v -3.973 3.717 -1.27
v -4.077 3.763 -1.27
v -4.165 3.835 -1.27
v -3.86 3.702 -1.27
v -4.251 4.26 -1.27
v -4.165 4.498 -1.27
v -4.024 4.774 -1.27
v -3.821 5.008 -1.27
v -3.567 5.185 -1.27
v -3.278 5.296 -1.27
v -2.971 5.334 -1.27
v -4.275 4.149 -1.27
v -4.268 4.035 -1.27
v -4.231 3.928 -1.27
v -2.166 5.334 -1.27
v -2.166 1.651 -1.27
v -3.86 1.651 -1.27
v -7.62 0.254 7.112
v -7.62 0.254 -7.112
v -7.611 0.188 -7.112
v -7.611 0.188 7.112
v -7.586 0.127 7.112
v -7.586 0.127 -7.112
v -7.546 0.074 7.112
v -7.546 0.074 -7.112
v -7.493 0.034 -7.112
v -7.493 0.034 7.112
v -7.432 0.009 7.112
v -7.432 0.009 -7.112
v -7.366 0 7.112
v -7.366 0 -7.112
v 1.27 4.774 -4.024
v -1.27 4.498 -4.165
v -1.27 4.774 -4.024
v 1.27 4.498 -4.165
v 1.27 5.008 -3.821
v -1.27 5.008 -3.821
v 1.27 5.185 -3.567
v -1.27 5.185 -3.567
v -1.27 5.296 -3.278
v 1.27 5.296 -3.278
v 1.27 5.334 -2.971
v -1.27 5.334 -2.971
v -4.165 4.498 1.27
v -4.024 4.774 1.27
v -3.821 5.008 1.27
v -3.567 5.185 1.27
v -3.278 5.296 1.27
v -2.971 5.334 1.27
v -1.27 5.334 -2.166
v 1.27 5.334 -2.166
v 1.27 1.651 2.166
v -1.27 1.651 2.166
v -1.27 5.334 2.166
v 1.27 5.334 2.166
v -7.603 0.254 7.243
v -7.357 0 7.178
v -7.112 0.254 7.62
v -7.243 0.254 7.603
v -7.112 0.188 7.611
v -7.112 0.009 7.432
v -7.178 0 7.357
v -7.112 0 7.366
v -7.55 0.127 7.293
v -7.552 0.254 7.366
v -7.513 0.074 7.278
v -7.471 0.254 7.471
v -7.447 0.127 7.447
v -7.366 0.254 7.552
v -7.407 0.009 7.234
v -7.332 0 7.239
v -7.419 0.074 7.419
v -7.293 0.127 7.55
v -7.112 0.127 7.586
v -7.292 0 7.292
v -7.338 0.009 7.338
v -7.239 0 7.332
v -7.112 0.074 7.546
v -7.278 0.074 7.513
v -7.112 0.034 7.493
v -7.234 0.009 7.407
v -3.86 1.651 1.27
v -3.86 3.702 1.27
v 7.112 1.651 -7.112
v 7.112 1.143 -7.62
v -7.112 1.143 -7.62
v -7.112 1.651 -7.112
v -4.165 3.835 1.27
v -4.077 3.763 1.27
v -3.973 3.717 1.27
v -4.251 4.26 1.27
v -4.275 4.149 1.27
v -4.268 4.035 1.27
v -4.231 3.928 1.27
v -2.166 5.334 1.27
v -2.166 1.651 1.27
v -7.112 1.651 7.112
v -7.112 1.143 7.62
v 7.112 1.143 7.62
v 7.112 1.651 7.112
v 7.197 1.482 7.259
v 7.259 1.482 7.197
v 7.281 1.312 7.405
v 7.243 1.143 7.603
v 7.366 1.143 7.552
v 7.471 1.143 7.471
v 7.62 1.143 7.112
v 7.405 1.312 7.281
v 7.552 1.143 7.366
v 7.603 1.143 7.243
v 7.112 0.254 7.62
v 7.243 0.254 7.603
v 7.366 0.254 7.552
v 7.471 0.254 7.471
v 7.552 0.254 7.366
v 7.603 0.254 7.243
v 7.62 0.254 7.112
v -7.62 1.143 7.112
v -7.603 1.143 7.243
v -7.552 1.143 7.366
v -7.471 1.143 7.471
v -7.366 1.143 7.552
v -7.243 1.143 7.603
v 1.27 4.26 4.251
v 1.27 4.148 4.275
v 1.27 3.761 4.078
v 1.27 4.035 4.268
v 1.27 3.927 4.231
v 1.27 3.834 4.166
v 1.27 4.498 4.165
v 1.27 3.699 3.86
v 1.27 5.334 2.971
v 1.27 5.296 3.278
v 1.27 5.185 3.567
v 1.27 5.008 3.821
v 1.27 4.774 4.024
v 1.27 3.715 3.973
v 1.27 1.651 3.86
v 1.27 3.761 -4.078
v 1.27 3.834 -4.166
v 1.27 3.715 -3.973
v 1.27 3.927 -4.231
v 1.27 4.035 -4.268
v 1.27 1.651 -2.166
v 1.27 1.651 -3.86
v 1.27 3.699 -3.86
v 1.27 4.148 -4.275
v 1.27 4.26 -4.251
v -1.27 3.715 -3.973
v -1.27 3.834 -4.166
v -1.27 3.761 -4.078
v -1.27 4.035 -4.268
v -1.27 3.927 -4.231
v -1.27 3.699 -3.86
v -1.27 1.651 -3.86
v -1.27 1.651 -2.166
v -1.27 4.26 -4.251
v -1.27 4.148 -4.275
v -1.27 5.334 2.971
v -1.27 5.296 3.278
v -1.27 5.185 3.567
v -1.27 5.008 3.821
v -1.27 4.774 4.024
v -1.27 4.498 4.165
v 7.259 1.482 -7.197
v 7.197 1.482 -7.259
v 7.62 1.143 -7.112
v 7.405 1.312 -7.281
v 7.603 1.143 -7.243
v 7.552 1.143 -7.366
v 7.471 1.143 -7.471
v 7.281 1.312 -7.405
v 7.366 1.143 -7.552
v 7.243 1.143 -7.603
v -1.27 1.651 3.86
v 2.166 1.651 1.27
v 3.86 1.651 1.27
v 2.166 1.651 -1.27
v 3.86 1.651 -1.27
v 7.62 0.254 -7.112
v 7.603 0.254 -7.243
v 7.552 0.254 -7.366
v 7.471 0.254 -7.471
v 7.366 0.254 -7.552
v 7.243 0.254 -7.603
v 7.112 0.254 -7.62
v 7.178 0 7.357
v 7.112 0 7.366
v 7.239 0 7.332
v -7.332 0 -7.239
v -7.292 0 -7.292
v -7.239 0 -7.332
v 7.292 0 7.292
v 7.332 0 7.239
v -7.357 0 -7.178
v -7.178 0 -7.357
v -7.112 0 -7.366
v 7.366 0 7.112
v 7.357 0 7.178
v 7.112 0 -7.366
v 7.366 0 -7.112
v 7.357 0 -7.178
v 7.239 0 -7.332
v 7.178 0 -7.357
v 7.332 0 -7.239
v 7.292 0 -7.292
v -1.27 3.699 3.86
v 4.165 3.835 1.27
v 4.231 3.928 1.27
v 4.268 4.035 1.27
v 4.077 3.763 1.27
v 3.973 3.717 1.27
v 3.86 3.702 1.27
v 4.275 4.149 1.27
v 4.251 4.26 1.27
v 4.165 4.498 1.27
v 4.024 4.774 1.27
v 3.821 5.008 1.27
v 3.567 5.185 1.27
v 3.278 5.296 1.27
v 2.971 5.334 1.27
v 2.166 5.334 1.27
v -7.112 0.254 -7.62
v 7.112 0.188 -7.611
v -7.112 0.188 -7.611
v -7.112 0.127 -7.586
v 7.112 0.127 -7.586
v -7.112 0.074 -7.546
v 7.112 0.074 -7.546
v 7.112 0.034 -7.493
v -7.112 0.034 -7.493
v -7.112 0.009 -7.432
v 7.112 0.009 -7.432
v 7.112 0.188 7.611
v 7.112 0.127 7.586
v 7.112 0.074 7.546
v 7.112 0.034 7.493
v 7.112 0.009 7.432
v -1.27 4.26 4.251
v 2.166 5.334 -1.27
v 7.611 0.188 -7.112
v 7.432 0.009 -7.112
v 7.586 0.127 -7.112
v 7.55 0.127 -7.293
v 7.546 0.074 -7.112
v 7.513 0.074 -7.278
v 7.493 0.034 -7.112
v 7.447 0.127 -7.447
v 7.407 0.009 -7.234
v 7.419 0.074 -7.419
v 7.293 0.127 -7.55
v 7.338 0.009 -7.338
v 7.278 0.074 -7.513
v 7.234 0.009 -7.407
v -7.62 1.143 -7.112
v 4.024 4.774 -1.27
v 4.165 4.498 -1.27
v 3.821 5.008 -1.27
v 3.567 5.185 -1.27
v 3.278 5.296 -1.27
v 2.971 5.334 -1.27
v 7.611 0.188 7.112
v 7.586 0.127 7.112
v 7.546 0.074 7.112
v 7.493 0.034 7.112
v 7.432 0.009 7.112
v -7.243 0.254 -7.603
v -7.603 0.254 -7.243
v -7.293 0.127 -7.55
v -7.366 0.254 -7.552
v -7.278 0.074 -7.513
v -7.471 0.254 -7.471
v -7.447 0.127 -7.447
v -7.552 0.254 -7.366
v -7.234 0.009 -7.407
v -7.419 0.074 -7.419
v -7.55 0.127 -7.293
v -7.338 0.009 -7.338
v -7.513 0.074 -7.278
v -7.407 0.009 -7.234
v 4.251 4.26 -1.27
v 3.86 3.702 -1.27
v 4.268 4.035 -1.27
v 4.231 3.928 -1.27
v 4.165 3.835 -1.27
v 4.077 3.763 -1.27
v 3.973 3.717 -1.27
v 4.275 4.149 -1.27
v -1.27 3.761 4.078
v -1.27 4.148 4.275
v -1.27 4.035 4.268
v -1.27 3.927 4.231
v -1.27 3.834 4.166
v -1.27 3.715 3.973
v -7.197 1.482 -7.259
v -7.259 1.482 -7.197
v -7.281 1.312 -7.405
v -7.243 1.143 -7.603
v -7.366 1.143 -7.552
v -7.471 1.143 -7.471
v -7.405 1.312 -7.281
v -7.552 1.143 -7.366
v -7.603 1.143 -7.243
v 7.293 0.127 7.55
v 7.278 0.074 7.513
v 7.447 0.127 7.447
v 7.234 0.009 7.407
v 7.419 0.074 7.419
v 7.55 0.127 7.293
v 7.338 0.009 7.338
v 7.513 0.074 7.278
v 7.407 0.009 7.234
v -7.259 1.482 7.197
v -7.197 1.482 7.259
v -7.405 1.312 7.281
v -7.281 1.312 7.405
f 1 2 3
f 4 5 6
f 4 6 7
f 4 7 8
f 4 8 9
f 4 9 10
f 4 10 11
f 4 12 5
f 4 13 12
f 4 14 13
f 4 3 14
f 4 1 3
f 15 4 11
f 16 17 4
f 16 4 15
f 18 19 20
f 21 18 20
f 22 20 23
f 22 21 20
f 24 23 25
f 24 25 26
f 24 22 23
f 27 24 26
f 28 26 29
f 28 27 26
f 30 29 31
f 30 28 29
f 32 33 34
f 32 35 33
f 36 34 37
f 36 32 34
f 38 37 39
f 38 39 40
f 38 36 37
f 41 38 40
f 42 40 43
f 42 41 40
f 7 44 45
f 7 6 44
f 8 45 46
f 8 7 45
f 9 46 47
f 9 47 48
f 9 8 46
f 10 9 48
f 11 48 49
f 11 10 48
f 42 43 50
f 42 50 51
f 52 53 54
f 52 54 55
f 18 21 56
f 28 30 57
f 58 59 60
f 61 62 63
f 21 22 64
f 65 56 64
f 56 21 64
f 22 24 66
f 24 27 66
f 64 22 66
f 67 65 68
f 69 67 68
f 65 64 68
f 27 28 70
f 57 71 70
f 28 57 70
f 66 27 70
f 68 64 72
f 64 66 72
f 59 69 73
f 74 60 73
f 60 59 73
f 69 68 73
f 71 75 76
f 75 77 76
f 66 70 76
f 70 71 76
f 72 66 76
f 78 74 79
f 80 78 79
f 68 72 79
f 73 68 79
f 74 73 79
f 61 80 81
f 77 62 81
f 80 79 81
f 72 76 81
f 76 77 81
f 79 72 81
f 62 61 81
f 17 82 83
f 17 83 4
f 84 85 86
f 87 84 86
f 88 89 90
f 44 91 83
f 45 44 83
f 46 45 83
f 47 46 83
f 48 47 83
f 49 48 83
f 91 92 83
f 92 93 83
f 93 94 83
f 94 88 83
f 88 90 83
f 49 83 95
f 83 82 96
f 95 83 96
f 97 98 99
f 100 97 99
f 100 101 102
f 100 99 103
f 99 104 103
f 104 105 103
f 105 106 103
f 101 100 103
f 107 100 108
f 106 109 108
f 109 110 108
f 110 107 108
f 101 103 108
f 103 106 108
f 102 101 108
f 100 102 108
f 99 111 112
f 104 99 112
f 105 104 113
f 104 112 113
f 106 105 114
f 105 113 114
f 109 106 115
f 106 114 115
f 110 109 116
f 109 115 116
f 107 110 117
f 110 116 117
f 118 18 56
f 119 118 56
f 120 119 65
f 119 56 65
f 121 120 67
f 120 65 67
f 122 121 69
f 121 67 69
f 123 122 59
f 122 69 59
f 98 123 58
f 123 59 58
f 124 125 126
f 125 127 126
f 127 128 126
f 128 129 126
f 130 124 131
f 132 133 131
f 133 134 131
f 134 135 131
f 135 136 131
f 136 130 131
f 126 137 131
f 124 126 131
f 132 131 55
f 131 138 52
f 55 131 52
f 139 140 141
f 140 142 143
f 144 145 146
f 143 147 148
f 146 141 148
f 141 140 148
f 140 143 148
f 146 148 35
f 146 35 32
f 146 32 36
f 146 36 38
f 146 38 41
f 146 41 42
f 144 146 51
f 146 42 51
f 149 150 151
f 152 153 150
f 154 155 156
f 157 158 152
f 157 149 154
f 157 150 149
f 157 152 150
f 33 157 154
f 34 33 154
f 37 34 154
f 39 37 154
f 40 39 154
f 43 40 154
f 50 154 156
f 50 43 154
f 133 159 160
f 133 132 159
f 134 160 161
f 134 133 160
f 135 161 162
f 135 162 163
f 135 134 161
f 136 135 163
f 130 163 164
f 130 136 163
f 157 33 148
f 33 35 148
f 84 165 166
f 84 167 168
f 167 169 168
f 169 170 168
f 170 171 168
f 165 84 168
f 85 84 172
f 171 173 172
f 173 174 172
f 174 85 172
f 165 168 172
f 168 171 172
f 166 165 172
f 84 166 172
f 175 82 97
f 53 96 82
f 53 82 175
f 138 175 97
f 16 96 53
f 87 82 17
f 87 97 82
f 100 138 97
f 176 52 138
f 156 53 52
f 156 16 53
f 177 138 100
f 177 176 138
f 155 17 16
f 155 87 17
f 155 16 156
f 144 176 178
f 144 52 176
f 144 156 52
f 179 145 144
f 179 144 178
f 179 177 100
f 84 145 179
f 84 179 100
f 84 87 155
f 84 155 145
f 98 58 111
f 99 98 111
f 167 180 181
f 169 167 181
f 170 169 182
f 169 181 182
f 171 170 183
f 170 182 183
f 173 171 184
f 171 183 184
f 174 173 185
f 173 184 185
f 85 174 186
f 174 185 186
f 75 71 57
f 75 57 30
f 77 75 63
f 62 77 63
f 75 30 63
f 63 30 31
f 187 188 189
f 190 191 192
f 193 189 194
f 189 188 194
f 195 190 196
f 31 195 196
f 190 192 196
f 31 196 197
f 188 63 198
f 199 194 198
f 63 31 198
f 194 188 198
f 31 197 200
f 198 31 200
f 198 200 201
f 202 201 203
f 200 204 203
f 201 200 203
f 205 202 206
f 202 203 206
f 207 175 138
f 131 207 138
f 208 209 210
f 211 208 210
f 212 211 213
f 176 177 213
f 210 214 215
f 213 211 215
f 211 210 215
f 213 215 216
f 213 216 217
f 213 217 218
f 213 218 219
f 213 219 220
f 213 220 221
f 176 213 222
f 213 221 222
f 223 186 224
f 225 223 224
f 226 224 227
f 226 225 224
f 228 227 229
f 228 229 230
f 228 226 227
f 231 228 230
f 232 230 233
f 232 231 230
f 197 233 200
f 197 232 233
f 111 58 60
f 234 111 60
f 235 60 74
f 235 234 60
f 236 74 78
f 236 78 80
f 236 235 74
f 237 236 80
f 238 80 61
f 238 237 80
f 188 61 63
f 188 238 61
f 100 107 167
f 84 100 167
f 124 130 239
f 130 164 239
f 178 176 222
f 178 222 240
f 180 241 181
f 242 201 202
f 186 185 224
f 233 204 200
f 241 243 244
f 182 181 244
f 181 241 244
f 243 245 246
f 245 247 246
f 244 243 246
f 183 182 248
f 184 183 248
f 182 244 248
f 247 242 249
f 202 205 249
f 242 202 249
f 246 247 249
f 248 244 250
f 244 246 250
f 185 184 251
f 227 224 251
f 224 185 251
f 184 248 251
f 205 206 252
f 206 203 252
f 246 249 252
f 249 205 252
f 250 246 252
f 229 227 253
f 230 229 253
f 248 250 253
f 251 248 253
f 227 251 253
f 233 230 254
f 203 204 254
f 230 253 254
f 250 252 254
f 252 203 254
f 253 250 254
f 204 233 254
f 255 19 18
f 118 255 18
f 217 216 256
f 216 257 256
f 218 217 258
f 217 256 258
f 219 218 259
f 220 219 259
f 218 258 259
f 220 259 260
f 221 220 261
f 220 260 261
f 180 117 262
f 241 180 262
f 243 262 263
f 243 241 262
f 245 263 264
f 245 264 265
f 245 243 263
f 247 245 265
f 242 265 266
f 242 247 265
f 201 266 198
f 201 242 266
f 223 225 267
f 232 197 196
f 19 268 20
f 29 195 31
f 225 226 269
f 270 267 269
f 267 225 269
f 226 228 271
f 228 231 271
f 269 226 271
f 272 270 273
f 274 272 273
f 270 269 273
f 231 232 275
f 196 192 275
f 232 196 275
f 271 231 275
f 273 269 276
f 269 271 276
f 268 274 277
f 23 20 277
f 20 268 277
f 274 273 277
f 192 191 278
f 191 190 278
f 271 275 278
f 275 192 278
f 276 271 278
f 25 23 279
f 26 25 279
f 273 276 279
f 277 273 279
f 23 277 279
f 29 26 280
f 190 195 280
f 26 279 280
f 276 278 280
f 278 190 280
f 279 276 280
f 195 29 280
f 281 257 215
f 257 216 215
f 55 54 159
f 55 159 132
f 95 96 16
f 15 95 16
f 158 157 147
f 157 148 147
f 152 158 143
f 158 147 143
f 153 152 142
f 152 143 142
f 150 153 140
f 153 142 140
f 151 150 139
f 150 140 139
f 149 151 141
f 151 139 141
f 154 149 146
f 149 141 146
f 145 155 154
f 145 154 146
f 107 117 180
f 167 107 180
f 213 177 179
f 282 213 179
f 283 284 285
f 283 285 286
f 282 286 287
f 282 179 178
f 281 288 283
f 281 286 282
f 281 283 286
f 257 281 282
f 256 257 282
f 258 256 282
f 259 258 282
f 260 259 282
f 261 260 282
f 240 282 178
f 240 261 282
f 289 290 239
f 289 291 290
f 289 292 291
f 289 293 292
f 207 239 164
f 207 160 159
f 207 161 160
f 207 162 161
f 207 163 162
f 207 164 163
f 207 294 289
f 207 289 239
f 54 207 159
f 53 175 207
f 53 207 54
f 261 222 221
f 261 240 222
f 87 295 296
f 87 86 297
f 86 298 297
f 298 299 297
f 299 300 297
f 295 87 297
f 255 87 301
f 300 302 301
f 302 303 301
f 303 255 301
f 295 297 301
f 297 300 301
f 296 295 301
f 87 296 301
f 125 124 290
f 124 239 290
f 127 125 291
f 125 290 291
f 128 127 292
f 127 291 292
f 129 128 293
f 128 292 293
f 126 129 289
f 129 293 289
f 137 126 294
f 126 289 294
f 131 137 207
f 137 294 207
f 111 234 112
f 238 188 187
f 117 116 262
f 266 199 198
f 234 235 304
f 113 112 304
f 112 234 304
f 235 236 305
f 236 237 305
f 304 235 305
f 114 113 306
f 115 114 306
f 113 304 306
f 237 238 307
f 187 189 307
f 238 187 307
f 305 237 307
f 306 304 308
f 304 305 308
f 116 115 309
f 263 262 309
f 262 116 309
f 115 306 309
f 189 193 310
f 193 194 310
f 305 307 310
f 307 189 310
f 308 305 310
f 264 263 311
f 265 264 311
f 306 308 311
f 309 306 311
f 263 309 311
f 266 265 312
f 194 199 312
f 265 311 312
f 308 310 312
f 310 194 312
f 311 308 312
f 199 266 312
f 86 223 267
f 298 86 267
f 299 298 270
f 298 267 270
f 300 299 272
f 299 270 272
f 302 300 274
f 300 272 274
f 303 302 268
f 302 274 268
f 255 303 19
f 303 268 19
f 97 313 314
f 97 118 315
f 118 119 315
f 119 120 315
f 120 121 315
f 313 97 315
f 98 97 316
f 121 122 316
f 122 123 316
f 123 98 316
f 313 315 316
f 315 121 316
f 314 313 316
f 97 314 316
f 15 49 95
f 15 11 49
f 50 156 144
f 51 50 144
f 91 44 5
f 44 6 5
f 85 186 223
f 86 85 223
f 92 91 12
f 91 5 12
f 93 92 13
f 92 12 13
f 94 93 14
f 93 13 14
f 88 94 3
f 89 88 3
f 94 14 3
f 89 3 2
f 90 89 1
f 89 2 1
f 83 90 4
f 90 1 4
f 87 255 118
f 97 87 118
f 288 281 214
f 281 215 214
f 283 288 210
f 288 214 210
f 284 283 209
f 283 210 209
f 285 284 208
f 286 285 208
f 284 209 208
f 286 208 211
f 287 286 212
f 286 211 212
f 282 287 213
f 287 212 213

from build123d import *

# Parameters (mm, degrees)
BOSS_EXTRUDE1_DEPTH = 1.651
SKETCH3_W           = 2.54
SKETCH3_H           = 1.694812446
SKETCH3_W_2         = 1.694812446
SKETCH3_H_2         = 2.54
BOSS_EXTRUDE2_DEPTH = 3.683
BOSS_EXTRUDE3_DEPTH = 1.27
BOSS_EXTRUDE4_DEPTH = 1.27
FILLET1_R           = 1.27
CHAMFER1_SIZE       = 0.508
FILLET2_R           = 0.254


with BuildPart() as part:
    # Sketch1 → Boss-Extrude1 (new body)
    with BuildSketch(Plane(origin=(0, 0, 0), x_dir=(1, 0, 0), z_dir=(0, 1, 0))):
        with BuildLine():
            Line((-7.62, 7.112), (-7.62, -7.112))
            ThreePointArc((-7.62, -7.112), (-7.471210245, -7.471210245), (-7.112, -7.62))
            Line((-7.112, -7.62), (7.112, -7.62))
            ThreePointArc((7.112, -7.62), (7.471210245, -7.471210245), (7.62, -7.112))
            Line((7.62, -7.112), (7.62, 7.112))
            ThreePointArc((7.62, 7.112), (7.471210245, 7.471210245), (7.112, 7.62))
            Line((7.112, 7.62), (-7.112, 7.62))
            ThreePointArc((-7.112, 7.62), (-7.471210245, 7.471210245), (-7.62, 7.112))
        make_face()
    extrude(amount=BOSS_EXTRUDE1_DEPTH)

    # Sketch3 → Boss-Extrude2 (add)
    with BuildSketch(Plane(origin=(0, 1.651, 0), x_dir=(1, 0, 0), z_dir=(0, 1, 0))):
        with Locations((0, 3.013059552)):
            Rectangle(SKETCH3_W, SKETCH3_H)
        with Locations((3.013059552, 0)):
            Rectangle(SKETCH3_W_2, SKETCH3_H_2)
        with Locations((0, -3.013059552)):
            Rectangle(SKETCH3_W, SKETCH3_H)
        with Locations((-3.013059552, 0)):
            Rectangle(SKETCH3_W_2, SKETCH3_H_2)
    extrude(amount=BOSS_EXTRUDE2_DEPTH)

    # Sketch4 → Boss-Extrude3 (add, symmetric)
    with BuildSketch(Plane.XY):
        with BuildLine():
            Line((-3.860465775, 5.334), (-4.251394799, 4.259931334))
            ThreePointArc((-4.251394799, 4.259931334), (-4.201247752, 3.879026697), (-3.860465775, 3.701626828))
            Line((-3.860465775, 3.701626828), (-3.860465775, 5.334))
        make_face()
        with BuildLine():
            Line((3.860465775, 5.334), (4.251394799, 4.259931334))
            ThreePointArc((4.251394799, 4.259931334), (4.201247752, 3.879026697), (3.860465775, 3.701626828))
            Line((3.860465775, 3.701626828), (3.860465775, 5.334))
        make_face()
    extrude(amount=BOSS_EXTRUDE3_DEPTH, both=True)

    # Sketch5 → Boss-Extrude4 (add, symmetric)
    with BuildSketch(Plane(origin=(0, 0, 0), x_dir=(0, 0, -1), z_dir=(1, 0, 0))):
        with BuildLine():
            Line((-3.860465775, 5.334), (-4.251394799, 4.259931334))
            ThreePointArc((-4.251394799, 4.259931334), (-4.201512131, 3.878082751), (-3.860465775, 3.699242027))
            Line((-3.860465775, 3.699242027), (-3.860465775, 5.334))
        make_face()
        with BuildLine():
            Line((3.860465775, 5.334), (4.251394799, 4.259931334))
            ThreePointArc((4.251394799, 4.259931334), (4.201512131, 3.878082751), (3.860465775, 3.699242027))
            Line((3.860465775, 3.699242027), (3.860465775, 5.334))
        make_face()
    extrude(amount=BOSS_EXTRUDE4_DEPTH, both=True)

    # Fillet1
    fillet1_edges = [part.edges().sort_by_distance(p)[0] for p in [
        (0, 5.334, -3.860465775),
        (3.860465775, 5.334, 0),
        (0, 5.334, 3.860465775),
        (-3.860465775, 5.334, 0),
    ]]
    fillet(fillet1_edges, radius=FILLET1_R)

    # Chamfer1
    chamfer1_edges = [part.edges().sort_by_distance(p)[0] for p in [
        (7.471210245, 1.651, 7.471210245),
        (7.62, 1.651, 0),
        (7.471210245, 1.651, -7.471210245),
        (0, 1.651, -7.62),
        (-7.471210245, 1.651, -7.471210245),
        (-7.62, 1.651, 0),
        (-7.471210245, 1.651, 7.471210245),
        (0, 1.651, 7.62),
    ]]
    chamfer(chamfer1_edges, length=CHAMFER1_SIZE - 0.0001)  # a hair under: the kernel refuses the full size

    # Fillet2
    fillet2_edges = [part.edges().sort_by_distance(p)[0] for p in [
        (0, 0, 7.62),
        (-7.471210245, 0, 7.471210245),
        (-7.62, 0, 0),
        (-7.471210245, 0, -7.471210245),
        (0, 0, -7.62),
        (7.471210245, 0, -7.471210245),
        (7.62, 0, 0),
        (7.471210245, 0, 7.471210245),
    ]]
    fillet(fillet2_edges, radius=FILLET2_R)


solid = part.part
